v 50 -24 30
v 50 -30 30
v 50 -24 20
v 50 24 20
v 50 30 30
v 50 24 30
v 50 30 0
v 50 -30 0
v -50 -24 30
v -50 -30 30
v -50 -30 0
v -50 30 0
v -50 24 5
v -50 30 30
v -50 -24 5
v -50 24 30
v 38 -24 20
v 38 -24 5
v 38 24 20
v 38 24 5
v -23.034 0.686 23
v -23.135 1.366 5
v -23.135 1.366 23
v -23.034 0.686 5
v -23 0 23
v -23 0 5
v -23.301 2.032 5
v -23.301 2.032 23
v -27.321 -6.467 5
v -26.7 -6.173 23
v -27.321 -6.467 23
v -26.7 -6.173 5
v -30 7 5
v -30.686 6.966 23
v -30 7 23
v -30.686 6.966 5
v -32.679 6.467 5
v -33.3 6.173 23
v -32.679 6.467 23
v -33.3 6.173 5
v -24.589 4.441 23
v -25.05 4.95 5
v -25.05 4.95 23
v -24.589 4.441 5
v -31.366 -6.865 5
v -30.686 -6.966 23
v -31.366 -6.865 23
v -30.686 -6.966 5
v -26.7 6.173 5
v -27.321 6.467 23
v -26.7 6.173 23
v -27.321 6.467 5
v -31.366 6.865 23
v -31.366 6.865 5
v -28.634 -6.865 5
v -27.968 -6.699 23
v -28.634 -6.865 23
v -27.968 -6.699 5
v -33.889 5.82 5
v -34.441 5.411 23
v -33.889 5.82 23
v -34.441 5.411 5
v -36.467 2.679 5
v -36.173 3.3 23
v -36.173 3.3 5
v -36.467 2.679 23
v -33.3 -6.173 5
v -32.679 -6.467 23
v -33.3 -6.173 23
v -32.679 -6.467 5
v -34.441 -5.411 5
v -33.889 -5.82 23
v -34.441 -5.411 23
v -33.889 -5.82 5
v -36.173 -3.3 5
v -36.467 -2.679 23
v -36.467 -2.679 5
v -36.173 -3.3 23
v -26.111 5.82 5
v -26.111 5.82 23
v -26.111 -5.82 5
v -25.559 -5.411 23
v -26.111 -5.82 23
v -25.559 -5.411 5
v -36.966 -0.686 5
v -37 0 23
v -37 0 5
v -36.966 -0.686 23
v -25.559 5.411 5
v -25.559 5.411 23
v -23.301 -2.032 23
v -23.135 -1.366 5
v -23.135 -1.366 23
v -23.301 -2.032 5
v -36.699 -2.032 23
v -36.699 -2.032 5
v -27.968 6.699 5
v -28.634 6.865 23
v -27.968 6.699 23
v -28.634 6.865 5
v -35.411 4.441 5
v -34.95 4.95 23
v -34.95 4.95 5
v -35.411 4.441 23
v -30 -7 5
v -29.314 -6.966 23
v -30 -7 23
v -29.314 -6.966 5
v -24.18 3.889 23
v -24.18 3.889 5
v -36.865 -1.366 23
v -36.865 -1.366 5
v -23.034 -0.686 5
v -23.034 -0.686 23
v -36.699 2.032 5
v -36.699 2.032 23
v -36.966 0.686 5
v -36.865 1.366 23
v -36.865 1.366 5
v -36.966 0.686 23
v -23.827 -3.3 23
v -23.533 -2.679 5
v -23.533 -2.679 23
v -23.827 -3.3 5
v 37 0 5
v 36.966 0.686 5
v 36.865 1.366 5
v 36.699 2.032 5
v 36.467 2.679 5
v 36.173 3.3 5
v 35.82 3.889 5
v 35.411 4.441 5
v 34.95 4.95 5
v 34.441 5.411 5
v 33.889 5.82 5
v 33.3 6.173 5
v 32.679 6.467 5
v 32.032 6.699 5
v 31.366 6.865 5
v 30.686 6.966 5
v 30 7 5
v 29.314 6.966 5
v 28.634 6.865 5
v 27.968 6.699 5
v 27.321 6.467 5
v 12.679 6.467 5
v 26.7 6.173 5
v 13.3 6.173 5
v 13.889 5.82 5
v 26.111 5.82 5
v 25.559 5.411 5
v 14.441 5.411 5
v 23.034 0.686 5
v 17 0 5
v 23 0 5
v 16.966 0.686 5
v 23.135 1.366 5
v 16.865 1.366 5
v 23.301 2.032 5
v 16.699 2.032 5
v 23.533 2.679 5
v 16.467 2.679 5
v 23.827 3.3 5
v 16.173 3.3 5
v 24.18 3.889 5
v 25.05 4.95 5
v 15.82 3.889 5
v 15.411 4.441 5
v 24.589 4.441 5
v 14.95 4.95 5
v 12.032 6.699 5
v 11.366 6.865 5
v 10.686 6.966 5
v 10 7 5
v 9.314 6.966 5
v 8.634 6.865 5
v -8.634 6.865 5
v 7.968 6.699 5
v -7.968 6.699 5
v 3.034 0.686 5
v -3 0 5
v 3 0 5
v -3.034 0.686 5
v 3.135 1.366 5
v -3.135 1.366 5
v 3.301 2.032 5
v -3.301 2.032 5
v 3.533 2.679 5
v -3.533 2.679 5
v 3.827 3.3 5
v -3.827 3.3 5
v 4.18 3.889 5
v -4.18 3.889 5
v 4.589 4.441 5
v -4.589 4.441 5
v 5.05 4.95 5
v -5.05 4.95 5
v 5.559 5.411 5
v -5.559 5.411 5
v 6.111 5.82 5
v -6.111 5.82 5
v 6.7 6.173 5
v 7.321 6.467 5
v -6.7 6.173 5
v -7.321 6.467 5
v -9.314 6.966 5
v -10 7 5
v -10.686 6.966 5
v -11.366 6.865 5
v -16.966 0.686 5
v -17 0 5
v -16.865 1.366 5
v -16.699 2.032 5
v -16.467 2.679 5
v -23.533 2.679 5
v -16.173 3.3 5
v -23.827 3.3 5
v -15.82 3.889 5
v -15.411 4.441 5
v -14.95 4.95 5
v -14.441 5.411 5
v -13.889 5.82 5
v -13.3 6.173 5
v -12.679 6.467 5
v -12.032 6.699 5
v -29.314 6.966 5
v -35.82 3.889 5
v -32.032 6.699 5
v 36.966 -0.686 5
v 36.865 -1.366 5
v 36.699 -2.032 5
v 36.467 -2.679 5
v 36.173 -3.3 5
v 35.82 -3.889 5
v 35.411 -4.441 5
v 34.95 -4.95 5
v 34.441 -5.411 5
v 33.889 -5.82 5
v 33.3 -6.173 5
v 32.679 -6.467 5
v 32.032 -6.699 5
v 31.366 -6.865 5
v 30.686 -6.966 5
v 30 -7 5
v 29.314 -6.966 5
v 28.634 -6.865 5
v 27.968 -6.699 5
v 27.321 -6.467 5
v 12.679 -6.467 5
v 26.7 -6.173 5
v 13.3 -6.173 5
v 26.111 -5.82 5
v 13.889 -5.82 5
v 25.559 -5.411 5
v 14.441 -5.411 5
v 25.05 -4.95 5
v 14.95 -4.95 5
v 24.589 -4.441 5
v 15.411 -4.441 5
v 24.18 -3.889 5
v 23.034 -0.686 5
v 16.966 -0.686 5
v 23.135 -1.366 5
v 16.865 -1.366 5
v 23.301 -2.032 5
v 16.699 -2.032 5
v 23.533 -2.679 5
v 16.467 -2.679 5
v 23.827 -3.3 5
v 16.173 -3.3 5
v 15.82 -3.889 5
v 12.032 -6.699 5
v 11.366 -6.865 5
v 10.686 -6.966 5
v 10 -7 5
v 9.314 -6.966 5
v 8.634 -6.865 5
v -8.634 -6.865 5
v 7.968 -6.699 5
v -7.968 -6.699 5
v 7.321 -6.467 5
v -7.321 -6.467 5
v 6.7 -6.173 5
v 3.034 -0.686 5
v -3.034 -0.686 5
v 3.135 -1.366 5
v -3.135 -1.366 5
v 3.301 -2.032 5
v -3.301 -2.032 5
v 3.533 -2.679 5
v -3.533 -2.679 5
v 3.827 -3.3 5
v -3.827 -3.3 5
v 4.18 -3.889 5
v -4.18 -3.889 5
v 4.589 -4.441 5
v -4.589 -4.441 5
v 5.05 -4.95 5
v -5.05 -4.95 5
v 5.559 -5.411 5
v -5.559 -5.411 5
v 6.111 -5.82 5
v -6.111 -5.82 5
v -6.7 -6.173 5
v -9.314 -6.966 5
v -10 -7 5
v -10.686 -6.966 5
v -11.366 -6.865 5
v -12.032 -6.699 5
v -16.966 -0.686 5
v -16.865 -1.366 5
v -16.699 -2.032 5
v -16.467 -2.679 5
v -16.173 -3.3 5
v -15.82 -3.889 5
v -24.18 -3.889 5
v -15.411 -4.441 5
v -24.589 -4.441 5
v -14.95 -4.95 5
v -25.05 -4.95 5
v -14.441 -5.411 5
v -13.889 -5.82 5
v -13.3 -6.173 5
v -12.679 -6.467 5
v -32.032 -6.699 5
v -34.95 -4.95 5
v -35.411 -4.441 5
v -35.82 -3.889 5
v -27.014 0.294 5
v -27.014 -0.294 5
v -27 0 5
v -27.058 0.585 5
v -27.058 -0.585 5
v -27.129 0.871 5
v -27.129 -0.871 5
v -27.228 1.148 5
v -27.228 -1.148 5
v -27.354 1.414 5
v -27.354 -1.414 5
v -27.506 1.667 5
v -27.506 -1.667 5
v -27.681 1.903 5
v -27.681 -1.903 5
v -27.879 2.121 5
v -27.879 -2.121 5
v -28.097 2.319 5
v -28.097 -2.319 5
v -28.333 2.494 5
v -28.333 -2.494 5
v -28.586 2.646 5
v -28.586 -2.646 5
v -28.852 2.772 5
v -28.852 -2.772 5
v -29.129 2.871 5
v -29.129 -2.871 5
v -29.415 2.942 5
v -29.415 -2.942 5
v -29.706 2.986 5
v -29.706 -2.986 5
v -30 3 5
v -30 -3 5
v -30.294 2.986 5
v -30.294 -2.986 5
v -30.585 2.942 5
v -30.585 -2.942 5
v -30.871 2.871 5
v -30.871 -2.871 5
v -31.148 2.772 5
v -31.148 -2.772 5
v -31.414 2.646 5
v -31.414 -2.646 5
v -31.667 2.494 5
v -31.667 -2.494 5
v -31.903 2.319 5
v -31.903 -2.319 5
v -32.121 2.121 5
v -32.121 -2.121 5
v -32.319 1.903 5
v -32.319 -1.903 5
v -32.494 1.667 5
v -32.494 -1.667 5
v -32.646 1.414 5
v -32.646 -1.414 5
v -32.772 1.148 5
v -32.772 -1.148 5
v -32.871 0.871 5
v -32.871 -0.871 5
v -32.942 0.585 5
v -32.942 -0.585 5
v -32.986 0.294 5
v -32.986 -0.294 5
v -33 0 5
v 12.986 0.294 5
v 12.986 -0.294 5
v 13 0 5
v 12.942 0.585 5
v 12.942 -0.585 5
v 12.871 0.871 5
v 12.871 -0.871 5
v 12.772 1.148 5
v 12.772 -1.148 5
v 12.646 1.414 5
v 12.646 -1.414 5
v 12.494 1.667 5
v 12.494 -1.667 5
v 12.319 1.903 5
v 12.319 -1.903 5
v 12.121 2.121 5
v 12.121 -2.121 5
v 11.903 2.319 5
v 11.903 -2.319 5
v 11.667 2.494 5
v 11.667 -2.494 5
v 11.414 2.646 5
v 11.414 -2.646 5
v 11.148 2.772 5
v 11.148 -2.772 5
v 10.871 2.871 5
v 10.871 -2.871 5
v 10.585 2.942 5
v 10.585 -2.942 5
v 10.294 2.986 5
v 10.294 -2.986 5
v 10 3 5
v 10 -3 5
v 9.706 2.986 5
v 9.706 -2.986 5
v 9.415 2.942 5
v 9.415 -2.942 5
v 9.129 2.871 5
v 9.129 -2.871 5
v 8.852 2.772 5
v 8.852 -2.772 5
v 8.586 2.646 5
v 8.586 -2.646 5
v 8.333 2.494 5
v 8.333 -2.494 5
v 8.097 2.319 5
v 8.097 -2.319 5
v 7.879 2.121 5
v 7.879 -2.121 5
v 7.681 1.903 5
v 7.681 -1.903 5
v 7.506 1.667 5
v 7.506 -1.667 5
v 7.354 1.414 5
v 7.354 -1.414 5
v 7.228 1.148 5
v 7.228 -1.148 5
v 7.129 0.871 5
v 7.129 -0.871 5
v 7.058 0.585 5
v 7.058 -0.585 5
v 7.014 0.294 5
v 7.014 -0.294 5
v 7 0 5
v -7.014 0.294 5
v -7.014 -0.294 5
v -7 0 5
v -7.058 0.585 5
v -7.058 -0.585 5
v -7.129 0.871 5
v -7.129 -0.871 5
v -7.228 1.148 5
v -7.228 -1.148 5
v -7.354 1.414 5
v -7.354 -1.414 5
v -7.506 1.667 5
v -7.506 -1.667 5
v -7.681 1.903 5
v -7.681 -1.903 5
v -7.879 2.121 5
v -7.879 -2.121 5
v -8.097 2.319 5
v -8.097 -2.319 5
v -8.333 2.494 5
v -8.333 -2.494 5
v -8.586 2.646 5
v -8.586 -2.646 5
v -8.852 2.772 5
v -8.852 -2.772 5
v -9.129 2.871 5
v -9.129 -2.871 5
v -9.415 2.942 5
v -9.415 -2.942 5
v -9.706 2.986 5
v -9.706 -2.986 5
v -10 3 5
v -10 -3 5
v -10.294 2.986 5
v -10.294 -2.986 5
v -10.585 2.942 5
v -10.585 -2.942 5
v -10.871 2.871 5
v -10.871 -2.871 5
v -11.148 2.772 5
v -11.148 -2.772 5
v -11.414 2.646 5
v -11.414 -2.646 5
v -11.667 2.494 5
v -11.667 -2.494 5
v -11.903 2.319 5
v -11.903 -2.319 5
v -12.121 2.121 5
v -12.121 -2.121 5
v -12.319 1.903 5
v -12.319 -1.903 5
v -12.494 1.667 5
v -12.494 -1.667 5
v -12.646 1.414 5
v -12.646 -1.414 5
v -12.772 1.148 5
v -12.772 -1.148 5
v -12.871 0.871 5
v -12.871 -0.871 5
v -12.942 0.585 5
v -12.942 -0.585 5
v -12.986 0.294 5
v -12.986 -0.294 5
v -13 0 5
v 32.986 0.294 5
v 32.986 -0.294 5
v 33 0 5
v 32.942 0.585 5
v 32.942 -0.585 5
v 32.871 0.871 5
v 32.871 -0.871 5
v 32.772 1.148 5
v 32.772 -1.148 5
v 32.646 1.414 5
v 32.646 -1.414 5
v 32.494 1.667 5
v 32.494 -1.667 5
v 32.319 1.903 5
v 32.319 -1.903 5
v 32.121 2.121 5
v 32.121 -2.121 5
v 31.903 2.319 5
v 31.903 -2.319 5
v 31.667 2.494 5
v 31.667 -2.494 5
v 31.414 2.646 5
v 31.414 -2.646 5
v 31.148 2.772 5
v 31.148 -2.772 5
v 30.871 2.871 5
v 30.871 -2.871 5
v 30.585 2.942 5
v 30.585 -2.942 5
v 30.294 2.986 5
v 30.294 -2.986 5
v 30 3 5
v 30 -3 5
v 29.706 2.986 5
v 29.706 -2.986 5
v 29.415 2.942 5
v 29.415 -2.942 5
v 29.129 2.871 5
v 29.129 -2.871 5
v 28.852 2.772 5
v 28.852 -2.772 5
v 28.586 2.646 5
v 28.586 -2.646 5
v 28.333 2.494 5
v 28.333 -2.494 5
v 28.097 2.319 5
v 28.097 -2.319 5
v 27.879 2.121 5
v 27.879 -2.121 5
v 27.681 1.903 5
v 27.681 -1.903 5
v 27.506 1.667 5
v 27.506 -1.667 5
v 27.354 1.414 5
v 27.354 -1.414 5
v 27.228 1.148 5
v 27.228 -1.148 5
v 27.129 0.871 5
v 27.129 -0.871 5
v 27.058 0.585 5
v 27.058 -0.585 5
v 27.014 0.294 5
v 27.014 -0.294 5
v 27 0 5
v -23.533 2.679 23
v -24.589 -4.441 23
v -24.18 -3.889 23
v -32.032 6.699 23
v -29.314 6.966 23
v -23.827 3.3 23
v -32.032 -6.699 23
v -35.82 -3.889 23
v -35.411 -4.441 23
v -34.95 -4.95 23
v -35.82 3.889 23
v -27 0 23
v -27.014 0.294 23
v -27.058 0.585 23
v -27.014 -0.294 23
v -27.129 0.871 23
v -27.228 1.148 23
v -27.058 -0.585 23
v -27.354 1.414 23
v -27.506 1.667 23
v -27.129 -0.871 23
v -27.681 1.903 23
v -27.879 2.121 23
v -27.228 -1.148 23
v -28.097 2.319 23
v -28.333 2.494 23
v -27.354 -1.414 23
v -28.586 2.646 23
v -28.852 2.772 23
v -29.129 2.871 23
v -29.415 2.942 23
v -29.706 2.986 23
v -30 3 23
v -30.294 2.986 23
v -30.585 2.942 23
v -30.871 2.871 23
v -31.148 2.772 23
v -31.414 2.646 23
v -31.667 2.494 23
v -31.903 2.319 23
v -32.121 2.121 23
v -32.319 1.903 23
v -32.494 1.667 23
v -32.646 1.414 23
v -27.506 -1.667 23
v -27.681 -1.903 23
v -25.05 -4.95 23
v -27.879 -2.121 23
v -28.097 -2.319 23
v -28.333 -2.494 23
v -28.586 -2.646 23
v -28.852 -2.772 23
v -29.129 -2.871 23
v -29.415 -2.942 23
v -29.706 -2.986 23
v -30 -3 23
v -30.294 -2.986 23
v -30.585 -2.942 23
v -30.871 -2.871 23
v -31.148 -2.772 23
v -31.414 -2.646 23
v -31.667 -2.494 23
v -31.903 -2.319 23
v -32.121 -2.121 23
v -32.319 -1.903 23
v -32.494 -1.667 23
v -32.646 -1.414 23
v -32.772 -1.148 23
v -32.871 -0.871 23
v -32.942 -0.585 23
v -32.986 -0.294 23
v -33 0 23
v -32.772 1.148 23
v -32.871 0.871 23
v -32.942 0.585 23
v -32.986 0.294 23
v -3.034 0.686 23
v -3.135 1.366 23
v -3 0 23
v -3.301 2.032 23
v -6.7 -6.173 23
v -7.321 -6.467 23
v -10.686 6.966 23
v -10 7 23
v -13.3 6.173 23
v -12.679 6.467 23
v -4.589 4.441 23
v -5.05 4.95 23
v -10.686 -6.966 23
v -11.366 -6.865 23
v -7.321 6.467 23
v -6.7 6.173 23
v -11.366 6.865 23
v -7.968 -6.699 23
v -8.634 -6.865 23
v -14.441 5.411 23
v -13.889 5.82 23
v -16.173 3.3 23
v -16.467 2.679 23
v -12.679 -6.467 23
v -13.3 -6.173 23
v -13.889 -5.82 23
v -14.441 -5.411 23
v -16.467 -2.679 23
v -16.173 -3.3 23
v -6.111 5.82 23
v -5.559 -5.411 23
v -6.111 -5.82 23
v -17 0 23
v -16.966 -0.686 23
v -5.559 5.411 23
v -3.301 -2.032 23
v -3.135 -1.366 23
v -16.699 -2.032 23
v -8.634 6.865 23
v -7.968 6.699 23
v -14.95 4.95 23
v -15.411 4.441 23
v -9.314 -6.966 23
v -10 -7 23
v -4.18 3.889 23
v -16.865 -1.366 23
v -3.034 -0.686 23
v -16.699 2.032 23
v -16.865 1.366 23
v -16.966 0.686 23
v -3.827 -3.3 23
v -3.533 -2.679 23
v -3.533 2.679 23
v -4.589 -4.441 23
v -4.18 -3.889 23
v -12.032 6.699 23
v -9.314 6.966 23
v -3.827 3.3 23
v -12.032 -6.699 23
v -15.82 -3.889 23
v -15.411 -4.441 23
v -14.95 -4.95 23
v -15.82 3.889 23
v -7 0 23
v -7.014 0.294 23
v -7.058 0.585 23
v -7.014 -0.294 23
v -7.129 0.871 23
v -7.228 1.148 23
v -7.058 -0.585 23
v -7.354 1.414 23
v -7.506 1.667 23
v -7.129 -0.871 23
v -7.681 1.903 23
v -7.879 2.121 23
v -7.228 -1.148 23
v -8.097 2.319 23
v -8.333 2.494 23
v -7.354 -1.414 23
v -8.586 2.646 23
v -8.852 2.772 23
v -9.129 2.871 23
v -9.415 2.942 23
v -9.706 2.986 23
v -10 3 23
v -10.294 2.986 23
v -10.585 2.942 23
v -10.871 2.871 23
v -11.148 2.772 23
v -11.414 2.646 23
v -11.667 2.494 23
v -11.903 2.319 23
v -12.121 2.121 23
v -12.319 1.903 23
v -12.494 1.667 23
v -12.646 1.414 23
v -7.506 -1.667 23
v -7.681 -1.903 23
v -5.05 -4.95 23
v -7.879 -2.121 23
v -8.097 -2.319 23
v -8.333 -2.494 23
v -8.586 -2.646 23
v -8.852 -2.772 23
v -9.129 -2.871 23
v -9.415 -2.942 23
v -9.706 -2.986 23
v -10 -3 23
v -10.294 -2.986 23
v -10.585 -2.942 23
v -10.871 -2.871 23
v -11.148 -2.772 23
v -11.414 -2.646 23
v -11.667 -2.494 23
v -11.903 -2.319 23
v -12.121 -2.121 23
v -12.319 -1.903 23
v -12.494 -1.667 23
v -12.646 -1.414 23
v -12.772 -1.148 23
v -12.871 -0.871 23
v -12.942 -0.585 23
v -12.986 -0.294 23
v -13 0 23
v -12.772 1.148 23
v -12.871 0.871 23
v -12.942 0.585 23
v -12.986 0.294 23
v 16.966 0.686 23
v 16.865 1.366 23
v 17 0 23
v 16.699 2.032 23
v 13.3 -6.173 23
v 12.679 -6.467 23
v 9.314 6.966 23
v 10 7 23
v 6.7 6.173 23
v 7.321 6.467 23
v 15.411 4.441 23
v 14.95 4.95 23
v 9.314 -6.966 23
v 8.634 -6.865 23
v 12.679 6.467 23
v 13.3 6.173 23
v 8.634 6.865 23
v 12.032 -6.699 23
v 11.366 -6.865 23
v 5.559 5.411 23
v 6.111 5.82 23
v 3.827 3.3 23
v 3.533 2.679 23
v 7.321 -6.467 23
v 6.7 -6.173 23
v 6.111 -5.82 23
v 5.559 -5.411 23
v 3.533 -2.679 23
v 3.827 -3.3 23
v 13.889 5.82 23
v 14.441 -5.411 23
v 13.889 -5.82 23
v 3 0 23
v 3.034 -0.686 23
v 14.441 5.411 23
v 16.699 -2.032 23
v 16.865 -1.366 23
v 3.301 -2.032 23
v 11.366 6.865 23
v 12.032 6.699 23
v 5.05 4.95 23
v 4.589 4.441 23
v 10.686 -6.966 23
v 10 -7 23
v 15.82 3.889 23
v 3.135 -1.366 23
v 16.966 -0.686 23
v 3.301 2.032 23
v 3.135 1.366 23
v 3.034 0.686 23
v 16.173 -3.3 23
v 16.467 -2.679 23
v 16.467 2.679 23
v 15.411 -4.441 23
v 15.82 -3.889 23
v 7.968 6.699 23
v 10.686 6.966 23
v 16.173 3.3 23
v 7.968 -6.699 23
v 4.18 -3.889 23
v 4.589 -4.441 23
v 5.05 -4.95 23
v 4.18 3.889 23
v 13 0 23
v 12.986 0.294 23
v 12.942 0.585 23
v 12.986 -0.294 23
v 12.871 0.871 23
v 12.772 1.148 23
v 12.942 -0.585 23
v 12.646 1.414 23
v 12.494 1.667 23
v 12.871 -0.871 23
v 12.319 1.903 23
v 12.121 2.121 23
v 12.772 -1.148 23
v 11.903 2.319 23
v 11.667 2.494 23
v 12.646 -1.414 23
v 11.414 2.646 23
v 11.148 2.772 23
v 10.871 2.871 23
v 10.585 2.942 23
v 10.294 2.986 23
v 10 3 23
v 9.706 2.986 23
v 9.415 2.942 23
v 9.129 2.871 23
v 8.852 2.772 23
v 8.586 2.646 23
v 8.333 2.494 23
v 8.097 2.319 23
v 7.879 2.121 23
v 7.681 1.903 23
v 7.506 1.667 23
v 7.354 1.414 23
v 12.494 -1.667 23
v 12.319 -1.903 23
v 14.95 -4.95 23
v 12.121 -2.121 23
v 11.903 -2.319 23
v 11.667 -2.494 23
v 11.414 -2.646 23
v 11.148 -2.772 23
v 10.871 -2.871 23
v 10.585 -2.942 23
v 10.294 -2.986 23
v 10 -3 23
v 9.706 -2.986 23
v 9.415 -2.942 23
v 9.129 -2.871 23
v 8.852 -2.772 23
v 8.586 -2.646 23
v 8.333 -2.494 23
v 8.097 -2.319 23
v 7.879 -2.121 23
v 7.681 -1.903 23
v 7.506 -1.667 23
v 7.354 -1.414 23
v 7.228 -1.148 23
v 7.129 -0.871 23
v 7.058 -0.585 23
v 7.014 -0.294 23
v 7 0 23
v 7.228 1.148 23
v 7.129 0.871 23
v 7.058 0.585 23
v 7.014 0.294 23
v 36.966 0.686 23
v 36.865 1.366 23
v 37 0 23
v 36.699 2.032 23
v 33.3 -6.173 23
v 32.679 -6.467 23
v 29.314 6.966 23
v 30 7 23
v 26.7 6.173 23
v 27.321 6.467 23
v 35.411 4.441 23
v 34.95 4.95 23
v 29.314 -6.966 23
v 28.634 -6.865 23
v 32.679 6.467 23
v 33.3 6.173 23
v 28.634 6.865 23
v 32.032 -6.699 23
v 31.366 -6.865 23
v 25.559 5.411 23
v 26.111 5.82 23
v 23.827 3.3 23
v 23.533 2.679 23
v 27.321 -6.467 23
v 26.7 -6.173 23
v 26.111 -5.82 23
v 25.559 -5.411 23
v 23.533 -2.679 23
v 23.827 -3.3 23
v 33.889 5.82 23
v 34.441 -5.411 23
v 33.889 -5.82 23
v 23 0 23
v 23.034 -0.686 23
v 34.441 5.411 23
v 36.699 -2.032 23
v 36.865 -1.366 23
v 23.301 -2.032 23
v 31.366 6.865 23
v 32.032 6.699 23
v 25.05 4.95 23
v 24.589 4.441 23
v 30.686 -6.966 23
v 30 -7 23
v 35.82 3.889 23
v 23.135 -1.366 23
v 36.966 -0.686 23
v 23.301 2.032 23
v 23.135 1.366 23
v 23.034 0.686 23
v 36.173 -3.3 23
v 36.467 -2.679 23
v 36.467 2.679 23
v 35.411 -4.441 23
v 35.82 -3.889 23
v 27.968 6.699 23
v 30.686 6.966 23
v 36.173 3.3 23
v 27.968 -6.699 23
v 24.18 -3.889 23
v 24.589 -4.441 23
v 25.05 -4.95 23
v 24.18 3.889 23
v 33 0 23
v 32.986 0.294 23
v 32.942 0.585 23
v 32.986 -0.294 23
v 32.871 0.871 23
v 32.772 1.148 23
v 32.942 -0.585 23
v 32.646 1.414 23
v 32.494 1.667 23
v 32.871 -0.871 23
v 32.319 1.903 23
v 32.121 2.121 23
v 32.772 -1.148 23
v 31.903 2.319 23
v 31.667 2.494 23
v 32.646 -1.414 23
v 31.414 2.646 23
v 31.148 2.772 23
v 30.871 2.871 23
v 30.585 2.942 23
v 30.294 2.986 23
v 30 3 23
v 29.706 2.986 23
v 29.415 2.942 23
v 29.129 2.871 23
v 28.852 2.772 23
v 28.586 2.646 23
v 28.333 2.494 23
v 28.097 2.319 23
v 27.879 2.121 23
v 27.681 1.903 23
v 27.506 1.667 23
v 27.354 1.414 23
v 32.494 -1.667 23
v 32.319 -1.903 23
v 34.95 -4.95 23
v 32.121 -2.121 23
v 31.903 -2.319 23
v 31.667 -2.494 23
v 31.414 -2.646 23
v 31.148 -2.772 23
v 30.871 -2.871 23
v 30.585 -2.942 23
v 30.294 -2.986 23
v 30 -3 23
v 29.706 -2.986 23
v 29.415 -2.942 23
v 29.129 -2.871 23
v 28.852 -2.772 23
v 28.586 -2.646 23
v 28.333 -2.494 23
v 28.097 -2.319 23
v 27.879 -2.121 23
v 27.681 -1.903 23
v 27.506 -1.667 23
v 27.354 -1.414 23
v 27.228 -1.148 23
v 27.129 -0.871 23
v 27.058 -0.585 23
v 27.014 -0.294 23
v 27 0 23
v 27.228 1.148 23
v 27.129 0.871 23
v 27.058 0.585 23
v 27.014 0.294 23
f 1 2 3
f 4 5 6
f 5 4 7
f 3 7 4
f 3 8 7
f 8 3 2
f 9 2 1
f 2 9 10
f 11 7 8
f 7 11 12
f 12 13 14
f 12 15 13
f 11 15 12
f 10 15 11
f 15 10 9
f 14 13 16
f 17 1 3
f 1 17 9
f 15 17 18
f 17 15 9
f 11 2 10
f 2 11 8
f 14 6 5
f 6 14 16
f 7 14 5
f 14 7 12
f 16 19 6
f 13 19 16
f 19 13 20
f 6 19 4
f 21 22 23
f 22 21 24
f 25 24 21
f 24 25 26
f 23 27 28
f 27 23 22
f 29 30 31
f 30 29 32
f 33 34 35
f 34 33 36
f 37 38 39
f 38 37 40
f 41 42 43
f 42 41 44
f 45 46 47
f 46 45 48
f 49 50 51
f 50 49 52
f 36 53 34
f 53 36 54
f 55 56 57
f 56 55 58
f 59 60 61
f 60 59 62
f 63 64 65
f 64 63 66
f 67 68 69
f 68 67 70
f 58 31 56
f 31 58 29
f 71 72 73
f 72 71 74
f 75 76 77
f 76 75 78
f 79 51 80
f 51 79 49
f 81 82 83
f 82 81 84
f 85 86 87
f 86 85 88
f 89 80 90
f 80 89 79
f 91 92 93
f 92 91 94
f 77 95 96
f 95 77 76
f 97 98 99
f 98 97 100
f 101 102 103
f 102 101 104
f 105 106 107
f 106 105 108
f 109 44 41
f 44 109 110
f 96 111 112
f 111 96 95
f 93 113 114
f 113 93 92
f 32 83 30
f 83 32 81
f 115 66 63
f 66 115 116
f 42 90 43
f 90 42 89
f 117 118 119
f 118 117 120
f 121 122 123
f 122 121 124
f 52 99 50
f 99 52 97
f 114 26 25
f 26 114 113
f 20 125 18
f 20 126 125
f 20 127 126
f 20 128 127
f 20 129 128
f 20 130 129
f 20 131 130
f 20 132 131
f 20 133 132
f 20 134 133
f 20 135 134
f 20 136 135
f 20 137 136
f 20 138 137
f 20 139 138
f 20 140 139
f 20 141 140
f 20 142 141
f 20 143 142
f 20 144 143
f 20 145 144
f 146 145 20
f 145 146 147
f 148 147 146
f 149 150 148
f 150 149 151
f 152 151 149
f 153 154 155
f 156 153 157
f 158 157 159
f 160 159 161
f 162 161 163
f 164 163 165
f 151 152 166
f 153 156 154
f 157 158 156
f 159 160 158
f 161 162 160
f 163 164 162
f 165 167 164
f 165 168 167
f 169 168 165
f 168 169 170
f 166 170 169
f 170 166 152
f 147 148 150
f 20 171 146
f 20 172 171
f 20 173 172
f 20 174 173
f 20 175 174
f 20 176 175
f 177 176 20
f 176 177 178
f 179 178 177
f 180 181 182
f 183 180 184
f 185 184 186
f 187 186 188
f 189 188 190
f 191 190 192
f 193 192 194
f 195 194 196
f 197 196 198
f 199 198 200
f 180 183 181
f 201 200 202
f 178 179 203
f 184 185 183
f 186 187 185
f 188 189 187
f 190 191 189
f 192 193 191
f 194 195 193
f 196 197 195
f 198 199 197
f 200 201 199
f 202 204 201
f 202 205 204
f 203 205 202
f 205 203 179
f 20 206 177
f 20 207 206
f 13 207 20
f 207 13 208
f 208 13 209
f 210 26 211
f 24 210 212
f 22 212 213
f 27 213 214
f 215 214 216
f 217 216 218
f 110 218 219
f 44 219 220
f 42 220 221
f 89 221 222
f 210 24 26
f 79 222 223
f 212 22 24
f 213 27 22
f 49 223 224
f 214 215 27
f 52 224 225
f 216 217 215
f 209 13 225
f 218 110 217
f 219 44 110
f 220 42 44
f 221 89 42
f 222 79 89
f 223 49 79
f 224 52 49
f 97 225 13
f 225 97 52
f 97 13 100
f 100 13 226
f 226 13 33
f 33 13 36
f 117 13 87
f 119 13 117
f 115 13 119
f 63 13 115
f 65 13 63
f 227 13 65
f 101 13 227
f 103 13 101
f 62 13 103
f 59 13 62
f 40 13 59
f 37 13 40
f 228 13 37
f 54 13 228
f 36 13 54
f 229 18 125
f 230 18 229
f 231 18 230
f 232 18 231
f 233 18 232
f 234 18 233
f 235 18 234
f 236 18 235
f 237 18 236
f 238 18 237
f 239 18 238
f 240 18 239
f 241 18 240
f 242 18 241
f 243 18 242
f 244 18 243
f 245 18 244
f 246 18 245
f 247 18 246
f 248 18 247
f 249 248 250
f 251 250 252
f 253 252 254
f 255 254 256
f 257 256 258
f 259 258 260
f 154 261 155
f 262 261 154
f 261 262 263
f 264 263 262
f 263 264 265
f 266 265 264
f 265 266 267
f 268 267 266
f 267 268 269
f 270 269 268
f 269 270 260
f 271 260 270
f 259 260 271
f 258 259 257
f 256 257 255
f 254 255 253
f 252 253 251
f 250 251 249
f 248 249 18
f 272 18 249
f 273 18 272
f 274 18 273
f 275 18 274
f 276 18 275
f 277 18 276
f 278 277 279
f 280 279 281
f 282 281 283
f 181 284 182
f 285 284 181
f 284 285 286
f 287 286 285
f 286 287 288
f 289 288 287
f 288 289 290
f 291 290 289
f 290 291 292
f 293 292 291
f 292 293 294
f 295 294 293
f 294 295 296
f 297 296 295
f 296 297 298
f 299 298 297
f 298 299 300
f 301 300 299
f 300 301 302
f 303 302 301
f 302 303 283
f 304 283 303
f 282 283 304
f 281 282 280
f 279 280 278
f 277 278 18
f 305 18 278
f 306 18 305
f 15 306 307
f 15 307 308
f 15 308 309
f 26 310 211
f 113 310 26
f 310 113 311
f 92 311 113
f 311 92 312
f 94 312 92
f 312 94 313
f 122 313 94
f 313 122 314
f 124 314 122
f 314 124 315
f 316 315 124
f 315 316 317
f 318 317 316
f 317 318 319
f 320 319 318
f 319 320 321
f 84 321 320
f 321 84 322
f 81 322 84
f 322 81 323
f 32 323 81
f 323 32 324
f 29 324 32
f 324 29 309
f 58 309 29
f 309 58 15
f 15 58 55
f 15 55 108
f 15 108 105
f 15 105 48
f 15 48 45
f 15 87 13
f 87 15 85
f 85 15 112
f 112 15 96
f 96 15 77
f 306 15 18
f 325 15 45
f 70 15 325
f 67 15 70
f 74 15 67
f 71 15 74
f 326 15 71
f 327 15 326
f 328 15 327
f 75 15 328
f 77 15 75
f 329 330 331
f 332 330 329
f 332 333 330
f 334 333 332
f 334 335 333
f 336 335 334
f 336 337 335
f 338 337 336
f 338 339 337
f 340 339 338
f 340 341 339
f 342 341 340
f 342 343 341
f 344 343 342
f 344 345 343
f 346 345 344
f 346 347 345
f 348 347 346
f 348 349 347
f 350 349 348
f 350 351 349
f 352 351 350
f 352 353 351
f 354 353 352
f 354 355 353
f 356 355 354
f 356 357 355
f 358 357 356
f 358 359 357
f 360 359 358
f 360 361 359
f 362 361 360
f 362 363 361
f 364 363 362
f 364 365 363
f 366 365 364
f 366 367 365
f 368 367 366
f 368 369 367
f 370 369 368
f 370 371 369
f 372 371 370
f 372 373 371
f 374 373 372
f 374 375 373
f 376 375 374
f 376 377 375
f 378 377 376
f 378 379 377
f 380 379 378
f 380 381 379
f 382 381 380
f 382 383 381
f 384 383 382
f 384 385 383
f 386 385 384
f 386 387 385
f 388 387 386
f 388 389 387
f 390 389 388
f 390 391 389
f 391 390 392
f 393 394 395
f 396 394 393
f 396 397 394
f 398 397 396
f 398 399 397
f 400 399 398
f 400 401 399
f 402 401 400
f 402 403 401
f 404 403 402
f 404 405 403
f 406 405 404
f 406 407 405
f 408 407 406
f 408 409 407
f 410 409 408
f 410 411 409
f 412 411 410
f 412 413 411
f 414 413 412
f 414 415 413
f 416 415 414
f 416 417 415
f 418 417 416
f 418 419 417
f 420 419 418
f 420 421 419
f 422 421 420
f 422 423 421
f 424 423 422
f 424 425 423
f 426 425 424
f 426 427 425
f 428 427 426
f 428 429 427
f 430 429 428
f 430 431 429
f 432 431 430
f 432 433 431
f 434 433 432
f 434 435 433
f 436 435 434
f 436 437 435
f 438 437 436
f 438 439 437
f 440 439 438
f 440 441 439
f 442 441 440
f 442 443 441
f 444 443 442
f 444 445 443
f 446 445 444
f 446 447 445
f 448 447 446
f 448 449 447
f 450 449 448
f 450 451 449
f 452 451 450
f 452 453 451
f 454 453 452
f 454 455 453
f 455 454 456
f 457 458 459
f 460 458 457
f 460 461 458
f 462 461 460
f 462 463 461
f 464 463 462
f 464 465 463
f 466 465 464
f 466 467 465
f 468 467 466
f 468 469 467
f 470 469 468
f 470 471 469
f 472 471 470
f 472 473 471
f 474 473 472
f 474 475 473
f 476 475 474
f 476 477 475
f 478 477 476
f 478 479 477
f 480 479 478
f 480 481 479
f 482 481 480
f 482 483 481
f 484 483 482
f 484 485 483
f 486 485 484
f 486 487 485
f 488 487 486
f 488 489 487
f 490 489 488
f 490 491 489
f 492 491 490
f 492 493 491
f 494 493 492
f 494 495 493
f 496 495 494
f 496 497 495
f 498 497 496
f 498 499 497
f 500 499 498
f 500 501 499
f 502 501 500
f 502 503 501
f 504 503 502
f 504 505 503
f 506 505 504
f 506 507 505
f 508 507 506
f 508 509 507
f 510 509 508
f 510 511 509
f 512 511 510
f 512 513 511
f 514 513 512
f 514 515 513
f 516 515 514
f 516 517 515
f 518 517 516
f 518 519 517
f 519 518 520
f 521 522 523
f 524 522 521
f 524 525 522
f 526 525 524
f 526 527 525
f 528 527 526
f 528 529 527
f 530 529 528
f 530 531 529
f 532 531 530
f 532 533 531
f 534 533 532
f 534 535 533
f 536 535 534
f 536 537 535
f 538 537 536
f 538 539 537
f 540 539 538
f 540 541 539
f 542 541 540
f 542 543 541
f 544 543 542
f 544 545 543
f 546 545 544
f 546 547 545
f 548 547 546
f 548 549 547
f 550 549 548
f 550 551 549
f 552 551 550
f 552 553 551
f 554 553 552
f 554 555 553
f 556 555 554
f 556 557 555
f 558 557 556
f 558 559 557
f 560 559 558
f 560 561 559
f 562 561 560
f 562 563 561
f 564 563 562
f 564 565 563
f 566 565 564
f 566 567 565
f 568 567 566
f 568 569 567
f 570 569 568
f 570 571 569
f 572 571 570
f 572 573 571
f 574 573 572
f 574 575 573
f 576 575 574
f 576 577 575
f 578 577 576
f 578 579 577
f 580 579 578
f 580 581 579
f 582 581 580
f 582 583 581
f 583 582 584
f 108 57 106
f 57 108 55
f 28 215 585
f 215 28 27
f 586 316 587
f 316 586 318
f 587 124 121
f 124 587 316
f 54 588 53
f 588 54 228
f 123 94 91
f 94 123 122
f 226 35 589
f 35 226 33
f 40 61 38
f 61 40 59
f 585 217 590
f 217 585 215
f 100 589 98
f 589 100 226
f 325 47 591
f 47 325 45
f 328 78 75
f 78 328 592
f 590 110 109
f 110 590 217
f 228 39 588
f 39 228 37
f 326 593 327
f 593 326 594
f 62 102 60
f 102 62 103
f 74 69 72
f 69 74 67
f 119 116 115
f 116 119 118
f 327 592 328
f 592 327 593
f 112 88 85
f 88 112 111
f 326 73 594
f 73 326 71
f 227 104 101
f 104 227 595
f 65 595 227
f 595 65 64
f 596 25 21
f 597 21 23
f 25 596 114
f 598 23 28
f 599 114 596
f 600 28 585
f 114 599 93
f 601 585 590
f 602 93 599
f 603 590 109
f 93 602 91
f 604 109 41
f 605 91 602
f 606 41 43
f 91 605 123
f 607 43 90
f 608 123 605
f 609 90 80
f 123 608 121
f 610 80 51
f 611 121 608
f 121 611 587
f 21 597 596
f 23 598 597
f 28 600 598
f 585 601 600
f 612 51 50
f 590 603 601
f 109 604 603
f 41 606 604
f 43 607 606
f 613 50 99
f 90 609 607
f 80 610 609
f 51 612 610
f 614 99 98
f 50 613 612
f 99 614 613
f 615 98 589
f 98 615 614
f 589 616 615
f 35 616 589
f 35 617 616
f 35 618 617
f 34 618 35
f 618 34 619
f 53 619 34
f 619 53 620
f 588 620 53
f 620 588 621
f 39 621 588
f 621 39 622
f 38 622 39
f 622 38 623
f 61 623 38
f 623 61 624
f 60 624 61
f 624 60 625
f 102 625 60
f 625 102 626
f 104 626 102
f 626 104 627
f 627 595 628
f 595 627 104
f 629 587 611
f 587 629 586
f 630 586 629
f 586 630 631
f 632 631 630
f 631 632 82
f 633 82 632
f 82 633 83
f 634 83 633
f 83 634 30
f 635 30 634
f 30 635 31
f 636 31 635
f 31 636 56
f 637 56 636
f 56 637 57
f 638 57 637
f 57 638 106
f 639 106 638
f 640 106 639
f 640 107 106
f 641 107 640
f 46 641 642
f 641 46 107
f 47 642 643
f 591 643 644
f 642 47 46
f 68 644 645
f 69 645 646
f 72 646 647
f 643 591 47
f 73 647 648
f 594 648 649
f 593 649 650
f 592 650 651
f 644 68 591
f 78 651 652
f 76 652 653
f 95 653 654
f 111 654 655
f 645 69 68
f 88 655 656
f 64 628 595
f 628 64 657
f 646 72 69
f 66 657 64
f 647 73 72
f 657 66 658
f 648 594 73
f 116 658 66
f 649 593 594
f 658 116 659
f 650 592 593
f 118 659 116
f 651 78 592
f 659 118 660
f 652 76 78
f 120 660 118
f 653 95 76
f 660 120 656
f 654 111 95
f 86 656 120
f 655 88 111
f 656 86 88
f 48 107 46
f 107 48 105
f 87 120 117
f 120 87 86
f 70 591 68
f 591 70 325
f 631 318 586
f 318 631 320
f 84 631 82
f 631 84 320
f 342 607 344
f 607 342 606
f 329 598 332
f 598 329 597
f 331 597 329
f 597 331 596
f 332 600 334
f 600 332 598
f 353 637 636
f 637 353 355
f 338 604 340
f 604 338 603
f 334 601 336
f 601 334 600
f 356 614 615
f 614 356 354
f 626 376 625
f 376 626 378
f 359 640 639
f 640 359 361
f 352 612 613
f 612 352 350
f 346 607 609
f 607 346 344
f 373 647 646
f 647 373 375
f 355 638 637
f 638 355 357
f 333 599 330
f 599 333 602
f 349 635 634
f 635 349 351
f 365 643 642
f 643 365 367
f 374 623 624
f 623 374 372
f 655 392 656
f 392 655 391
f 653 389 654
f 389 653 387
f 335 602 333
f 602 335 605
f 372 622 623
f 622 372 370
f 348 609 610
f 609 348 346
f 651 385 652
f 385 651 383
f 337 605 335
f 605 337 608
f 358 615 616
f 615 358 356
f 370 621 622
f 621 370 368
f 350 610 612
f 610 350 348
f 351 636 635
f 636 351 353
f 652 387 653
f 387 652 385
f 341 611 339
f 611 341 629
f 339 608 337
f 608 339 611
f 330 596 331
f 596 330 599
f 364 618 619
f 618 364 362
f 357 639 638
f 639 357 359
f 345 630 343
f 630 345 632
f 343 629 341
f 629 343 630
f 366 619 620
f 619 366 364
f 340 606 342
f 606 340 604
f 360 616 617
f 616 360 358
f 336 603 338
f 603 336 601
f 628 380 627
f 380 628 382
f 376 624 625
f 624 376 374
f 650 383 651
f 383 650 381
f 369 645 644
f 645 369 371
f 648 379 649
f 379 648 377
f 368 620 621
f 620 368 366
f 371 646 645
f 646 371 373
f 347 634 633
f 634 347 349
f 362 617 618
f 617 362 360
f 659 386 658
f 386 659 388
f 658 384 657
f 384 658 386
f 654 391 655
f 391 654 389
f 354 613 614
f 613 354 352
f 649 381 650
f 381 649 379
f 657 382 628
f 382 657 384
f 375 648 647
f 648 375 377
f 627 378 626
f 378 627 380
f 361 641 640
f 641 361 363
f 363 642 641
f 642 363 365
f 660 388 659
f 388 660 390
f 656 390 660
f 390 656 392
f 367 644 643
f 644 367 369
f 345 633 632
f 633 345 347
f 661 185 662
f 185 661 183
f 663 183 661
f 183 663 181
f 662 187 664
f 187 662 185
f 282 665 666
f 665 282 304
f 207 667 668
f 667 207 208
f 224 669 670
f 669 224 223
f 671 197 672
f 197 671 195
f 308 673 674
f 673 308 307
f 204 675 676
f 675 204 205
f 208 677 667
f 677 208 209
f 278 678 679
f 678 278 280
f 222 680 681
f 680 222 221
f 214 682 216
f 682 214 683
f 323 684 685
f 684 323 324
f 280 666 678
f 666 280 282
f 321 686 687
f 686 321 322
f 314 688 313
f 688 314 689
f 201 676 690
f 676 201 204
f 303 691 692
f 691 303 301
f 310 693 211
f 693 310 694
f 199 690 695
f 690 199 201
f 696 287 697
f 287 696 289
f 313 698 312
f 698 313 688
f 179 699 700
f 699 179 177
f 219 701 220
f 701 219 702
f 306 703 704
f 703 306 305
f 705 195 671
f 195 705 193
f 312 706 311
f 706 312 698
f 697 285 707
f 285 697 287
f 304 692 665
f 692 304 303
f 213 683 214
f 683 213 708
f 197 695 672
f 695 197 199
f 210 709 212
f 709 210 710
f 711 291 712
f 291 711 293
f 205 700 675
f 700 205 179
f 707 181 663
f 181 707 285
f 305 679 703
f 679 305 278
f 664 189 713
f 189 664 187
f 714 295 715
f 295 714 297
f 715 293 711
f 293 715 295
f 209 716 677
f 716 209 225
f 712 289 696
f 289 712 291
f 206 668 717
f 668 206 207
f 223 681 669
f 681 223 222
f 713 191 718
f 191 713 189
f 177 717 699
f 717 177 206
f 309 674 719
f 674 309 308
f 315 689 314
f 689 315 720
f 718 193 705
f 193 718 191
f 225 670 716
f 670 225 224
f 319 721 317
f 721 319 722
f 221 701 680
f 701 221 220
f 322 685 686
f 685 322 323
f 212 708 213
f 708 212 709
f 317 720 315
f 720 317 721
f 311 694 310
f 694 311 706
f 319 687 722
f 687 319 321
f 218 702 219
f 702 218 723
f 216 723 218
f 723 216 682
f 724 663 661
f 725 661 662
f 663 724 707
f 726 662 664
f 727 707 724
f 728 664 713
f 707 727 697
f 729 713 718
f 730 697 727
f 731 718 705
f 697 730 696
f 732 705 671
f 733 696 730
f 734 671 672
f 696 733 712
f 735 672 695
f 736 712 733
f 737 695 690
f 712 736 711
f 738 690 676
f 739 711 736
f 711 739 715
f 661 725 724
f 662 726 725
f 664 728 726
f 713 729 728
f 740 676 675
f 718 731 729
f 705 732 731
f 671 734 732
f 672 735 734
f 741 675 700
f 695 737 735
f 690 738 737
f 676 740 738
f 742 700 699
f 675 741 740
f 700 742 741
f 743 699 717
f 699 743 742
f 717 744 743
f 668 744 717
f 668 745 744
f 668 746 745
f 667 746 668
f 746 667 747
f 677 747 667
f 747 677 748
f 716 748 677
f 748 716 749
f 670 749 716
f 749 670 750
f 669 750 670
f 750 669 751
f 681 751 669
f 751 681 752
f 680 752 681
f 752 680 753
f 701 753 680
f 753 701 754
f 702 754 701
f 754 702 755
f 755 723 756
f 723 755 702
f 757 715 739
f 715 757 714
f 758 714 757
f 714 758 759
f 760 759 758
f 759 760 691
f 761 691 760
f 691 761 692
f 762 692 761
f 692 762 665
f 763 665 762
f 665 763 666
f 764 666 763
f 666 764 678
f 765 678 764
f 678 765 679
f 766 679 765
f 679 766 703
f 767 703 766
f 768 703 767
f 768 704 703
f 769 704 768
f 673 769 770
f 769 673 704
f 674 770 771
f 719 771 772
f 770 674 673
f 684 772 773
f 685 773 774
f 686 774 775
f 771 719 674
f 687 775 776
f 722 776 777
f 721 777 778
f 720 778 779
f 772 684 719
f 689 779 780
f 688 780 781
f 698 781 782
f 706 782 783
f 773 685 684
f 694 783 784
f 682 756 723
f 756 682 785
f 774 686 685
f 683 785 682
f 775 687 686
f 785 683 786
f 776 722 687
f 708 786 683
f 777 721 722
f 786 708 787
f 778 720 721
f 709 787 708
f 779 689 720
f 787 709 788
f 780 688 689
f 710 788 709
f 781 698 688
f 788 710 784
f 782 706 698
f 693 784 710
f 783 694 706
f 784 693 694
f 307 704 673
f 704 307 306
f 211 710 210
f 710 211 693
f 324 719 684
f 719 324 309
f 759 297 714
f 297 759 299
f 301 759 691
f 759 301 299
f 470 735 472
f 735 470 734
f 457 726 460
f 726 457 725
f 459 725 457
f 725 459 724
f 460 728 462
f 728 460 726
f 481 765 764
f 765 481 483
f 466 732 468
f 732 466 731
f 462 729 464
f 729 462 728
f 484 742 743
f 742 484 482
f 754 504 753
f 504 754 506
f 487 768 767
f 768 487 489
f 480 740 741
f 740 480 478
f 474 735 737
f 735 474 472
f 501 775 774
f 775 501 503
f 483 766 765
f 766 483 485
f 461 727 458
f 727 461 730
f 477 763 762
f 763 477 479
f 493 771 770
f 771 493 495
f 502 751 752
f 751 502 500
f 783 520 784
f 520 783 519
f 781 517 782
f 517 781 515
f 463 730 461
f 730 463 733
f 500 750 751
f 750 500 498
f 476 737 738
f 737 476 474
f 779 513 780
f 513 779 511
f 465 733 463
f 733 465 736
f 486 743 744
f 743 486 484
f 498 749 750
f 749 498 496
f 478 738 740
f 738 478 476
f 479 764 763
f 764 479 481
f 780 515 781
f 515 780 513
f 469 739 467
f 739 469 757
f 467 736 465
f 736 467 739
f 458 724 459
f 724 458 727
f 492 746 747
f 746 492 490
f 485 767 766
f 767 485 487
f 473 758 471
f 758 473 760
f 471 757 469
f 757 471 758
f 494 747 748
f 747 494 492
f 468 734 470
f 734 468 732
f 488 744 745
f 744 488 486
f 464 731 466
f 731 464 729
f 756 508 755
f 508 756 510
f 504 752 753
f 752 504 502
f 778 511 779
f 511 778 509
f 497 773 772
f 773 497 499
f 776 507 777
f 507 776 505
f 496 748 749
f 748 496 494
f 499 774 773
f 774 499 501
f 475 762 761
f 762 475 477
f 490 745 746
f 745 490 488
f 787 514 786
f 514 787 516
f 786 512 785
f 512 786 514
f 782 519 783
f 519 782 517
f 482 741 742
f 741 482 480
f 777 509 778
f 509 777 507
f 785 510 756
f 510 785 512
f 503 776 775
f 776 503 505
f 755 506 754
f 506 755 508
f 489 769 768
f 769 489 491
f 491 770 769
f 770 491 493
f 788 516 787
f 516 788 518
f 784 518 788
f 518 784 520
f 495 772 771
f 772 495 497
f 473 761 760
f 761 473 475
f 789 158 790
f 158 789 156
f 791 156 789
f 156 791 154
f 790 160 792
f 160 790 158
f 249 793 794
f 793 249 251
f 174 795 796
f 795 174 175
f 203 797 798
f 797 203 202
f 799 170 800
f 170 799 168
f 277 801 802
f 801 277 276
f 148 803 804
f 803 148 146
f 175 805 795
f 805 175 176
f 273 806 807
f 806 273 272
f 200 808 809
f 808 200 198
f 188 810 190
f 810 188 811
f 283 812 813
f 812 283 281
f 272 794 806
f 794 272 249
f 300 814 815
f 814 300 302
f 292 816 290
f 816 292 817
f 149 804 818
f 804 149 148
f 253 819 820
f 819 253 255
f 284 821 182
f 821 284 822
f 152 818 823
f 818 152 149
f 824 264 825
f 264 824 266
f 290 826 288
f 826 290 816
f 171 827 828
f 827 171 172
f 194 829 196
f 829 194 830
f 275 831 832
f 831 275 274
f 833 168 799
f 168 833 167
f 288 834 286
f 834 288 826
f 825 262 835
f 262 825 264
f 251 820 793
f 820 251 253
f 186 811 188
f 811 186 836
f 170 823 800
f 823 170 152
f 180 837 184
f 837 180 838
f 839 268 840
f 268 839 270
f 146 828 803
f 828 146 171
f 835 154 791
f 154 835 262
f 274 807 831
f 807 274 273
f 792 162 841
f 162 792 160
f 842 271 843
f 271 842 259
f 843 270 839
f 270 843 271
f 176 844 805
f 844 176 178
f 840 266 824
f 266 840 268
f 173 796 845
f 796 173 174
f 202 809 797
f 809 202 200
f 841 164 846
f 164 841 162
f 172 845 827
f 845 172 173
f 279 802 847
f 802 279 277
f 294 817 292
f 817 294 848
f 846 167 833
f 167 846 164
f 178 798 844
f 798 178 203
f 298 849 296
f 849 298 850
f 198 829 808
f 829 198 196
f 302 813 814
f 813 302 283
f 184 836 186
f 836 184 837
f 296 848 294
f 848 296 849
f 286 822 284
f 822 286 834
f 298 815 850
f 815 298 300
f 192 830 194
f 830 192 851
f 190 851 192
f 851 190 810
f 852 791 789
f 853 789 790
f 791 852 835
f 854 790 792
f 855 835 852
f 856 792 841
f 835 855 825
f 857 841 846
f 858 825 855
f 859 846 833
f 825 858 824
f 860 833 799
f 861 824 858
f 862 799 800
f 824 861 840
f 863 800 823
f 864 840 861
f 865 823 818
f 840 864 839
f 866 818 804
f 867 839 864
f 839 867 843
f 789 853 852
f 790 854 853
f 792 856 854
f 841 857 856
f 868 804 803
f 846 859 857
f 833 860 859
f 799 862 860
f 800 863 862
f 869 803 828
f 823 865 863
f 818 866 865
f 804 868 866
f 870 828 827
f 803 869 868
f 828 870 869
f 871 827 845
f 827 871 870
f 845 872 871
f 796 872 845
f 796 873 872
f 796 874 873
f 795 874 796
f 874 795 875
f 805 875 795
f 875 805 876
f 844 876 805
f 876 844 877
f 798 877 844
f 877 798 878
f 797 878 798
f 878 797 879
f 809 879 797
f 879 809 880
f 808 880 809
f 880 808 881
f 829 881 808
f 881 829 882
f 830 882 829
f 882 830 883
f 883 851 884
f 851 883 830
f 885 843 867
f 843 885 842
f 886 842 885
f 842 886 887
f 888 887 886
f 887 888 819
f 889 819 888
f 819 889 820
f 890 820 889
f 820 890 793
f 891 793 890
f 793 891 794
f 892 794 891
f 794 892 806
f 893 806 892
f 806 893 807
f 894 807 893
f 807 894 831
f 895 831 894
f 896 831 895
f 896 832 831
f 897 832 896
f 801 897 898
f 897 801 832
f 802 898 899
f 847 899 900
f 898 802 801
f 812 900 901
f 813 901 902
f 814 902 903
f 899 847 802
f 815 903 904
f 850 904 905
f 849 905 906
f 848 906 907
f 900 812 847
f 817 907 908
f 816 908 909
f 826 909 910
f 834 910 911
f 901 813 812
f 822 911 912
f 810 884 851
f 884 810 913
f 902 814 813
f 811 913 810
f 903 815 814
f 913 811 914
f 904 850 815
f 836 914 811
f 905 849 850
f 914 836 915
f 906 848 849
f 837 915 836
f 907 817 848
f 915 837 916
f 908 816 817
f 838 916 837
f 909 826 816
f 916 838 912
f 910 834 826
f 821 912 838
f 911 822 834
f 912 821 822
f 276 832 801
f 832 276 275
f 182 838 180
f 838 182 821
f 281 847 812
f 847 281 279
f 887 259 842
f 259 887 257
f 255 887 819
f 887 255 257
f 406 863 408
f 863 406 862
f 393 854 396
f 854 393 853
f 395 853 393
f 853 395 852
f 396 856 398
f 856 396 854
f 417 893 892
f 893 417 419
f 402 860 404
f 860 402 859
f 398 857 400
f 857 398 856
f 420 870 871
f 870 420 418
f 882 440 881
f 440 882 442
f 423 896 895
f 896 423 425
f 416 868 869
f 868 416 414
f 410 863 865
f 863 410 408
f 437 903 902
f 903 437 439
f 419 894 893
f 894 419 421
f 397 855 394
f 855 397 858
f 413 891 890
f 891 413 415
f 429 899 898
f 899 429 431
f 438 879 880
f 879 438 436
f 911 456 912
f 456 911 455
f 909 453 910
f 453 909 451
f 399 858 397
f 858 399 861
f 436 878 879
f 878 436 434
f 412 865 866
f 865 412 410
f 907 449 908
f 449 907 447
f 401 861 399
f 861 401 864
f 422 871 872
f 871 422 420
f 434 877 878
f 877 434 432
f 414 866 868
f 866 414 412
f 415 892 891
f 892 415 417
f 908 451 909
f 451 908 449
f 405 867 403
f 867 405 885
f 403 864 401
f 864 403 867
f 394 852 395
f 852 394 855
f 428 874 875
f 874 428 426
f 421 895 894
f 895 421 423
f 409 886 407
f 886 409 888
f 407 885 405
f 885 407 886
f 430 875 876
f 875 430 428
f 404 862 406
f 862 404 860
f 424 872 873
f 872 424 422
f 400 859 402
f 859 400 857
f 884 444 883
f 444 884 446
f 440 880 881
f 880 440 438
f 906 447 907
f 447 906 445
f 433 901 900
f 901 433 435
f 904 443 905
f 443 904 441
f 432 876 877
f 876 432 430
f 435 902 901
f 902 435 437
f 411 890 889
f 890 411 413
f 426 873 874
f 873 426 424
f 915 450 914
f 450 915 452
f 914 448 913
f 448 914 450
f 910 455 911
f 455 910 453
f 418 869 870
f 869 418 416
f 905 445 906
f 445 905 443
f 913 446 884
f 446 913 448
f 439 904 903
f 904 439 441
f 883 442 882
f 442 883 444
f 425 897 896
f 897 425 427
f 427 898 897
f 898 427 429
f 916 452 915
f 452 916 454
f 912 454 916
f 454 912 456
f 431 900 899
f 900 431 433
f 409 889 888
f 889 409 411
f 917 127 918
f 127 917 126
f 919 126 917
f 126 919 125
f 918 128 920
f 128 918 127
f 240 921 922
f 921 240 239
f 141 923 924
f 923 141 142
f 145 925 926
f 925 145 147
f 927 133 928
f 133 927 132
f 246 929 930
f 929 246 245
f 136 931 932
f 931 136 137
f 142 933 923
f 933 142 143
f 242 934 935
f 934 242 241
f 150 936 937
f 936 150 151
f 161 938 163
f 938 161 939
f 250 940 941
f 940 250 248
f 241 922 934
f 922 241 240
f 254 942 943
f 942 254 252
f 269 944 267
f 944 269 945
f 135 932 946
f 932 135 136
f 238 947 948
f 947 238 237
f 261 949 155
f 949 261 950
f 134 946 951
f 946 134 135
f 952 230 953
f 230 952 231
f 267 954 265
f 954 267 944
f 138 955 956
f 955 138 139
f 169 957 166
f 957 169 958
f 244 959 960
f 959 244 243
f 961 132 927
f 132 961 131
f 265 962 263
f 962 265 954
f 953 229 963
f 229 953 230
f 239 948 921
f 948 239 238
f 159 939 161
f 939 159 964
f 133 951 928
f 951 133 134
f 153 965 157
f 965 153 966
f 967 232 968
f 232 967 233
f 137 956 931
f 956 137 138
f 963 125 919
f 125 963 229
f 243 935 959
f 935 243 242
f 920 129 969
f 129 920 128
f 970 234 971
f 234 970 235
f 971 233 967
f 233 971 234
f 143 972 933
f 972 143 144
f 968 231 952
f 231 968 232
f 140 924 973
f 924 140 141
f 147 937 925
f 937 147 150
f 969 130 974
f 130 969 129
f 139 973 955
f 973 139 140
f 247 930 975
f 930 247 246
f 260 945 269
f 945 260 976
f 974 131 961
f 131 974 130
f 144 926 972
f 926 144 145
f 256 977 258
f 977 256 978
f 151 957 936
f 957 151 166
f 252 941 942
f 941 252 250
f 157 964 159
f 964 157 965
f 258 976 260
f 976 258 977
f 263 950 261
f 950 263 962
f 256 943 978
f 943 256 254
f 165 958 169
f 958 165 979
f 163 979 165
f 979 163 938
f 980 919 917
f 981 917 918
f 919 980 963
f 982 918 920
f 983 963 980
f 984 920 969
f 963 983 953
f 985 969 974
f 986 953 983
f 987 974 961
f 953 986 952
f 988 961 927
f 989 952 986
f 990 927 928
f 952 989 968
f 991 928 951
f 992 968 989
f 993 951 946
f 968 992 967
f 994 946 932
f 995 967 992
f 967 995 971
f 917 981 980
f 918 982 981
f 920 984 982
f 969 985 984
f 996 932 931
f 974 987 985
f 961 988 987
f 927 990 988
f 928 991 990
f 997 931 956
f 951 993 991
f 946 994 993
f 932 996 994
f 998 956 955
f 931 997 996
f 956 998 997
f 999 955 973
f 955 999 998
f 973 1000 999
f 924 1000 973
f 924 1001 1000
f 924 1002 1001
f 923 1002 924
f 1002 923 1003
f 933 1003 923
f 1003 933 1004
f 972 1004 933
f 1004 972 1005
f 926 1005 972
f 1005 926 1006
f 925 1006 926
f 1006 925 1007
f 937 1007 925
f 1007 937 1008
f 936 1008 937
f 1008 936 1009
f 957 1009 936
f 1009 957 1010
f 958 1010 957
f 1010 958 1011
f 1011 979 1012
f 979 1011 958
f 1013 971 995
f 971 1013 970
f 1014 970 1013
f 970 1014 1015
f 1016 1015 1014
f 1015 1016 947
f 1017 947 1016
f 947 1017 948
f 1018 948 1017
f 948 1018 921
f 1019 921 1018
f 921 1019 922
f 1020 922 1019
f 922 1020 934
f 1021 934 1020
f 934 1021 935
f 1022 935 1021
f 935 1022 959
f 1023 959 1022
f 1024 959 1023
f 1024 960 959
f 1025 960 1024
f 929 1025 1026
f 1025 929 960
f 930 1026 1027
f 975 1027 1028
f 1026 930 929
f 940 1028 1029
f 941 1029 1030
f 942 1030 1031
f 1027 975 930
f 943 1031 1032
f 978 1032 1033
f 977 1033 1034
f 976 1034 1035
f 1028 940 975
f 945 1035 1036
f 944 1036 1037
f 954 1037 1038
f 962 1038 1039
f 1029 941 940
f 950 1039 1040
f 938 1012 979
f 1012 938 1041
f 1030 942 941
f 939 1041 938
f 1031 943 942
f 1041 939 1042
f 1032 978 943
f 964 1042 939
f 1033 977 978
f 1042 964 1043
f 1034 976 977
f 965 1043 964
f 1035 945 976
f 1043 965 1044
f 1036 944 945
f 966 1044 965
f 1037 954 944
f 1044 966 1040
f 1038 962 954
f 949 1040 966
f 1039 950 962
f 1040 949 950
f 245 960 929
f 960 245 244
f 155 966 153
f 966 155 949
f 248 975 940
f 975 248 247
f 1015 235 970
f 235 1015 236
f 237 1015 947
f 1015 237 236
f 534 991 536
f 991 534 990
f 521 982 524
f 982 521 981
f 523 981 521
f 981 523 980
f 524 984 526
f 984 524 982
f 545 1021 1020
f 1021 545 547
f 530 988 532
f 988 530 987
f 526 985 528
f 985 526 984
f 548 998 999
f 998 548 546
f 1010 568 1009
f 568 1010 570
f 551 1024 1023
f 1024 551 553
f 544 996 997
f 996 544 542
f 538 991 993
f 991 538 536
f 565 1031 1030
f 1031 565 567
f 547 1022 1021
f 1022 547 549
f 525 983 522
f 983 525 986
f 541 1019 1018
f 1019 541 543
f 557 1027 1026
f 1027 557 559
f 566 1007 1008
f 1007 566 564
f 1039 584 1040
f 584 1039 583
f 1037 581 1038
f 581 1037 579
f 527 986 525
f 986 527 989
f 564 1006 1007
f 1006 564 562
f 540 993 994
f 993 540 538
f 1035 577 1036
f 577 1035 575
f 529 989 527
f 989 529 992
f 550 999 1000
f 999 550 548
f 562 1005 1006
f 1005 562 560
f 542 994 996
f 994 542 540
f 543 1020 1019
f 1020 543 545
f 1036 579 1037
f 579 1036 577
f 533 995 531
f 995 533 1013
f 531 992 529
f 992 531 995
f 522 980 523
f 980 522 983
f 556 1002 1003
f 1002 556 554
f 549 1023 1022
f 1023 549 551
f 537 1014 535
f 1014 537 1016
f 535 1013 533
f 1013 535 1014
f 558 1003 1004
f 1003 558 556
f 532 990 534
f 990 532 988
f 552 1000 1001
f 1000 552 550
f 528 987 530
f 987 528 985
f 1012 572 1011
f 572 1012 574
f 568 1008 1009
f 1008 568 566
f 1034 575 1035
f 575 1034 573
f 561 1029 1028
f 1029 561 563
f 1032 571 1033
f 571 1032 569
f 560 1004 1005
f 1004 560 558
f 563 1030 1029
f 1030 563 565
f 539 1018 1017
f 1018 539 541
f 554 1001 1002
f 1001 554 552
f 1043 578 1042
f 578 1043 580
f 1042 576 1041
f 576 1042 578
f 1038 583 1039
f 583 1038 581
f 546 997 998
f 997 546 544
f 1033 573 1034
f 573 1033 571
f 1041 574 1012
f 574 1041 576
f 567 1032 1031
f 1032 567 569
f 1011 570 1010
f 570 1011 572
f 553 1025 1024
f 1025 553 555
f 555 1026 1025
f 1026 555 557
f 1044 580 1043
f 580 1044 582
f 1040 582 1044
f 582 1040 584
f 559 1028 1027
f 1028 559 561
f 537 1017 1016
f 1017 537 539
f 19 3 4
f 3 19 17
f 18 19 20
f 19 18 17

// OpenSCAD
// ------------------------------------------------------------------
// Parametric channel tray with annular posts
// ------------------------------------------------------------------
// Dimensions (mm)
base_L      = 100;   // base plate length  (X)
base_W      = 60;    // base plate width   (Y)
base_T      = 5;     // base plate thickness

wall_T      = 6;     // long side-wall thickness
wall_H      = 25;    // side-wall height above base top (tallest build)

tab_L       = 12;    // end tab thickness along X
tab_H       = 15;    // end tab height above base top (lower step)

post_OD     = 14;    // annular post outer diameter
post_ID     = 6;     // annular post center hole diameter
post_H      = 18;    // post height above base top
post_n      = 4;     // number of posts in the row
post_pitch  = 20;    // post spacing along X
post_x0     = -30;   // X of first post

$fn = 64;

// ------------------------------------------------------------------
// Base plate : flat rectangular slab, top face at z = base_T
// ------------------------------------------------------------------
module base_plate() {
    translate([0, 0, base_T/2])
        cube([base_L, base_W, base_T], center = true);
}

// ------------------------------------------------------------------
// Long side walls : two raised walls leaving an open channel
// ------------------------------------------------------------------
module side_walls() {
    for (s = [-1, 1]) {
        translate([0, s*(base_W/2 - wall_T/2), (base_T + wall_H)/2])
            cube([base_L, wall_T, base_T + wall_H], center = true);
    }
}

// ------------------------------------------------------------------
// End tab : short rectangular addition inside the wall outline,
//           reaching only the lower step height
// ------------------------------------------------------------------
module end_tab() {
    inner_W = base_W - 2*wall_T;                 // fits between the walls
    translate([base_L/2 - tab_L/2, 0, (base_T + tab_H)/2])
        cube([tab_L, inner_W, base_T + tab_H], center = true);
}

// ------------------------------------------------------------------
// Annular posts : ring solids with a real central opening that does
//                 NOT pierce the base (hole spans only post height)
// ------------------------------------------------------------------
module posts() {
    for (i = [0 : post_n - 1]) {
        translate([post_x0 + i*post_pitch, 0, base_T])
            difference() {
                cylinder(h = post_H, d = post_OD);            // ring body
                translate([0, 0, -0.01])                      // keeps base solid
                    cylinder(h = post_H + 0.1, d = post_ID);  // central hole
            }
    }
}

// ------------------------------------------------------------------
// Assembly
// ------------------------------------------------------------------
union() {
    base_plate();
    side_walls();
    end_tab();
    posts();
}
